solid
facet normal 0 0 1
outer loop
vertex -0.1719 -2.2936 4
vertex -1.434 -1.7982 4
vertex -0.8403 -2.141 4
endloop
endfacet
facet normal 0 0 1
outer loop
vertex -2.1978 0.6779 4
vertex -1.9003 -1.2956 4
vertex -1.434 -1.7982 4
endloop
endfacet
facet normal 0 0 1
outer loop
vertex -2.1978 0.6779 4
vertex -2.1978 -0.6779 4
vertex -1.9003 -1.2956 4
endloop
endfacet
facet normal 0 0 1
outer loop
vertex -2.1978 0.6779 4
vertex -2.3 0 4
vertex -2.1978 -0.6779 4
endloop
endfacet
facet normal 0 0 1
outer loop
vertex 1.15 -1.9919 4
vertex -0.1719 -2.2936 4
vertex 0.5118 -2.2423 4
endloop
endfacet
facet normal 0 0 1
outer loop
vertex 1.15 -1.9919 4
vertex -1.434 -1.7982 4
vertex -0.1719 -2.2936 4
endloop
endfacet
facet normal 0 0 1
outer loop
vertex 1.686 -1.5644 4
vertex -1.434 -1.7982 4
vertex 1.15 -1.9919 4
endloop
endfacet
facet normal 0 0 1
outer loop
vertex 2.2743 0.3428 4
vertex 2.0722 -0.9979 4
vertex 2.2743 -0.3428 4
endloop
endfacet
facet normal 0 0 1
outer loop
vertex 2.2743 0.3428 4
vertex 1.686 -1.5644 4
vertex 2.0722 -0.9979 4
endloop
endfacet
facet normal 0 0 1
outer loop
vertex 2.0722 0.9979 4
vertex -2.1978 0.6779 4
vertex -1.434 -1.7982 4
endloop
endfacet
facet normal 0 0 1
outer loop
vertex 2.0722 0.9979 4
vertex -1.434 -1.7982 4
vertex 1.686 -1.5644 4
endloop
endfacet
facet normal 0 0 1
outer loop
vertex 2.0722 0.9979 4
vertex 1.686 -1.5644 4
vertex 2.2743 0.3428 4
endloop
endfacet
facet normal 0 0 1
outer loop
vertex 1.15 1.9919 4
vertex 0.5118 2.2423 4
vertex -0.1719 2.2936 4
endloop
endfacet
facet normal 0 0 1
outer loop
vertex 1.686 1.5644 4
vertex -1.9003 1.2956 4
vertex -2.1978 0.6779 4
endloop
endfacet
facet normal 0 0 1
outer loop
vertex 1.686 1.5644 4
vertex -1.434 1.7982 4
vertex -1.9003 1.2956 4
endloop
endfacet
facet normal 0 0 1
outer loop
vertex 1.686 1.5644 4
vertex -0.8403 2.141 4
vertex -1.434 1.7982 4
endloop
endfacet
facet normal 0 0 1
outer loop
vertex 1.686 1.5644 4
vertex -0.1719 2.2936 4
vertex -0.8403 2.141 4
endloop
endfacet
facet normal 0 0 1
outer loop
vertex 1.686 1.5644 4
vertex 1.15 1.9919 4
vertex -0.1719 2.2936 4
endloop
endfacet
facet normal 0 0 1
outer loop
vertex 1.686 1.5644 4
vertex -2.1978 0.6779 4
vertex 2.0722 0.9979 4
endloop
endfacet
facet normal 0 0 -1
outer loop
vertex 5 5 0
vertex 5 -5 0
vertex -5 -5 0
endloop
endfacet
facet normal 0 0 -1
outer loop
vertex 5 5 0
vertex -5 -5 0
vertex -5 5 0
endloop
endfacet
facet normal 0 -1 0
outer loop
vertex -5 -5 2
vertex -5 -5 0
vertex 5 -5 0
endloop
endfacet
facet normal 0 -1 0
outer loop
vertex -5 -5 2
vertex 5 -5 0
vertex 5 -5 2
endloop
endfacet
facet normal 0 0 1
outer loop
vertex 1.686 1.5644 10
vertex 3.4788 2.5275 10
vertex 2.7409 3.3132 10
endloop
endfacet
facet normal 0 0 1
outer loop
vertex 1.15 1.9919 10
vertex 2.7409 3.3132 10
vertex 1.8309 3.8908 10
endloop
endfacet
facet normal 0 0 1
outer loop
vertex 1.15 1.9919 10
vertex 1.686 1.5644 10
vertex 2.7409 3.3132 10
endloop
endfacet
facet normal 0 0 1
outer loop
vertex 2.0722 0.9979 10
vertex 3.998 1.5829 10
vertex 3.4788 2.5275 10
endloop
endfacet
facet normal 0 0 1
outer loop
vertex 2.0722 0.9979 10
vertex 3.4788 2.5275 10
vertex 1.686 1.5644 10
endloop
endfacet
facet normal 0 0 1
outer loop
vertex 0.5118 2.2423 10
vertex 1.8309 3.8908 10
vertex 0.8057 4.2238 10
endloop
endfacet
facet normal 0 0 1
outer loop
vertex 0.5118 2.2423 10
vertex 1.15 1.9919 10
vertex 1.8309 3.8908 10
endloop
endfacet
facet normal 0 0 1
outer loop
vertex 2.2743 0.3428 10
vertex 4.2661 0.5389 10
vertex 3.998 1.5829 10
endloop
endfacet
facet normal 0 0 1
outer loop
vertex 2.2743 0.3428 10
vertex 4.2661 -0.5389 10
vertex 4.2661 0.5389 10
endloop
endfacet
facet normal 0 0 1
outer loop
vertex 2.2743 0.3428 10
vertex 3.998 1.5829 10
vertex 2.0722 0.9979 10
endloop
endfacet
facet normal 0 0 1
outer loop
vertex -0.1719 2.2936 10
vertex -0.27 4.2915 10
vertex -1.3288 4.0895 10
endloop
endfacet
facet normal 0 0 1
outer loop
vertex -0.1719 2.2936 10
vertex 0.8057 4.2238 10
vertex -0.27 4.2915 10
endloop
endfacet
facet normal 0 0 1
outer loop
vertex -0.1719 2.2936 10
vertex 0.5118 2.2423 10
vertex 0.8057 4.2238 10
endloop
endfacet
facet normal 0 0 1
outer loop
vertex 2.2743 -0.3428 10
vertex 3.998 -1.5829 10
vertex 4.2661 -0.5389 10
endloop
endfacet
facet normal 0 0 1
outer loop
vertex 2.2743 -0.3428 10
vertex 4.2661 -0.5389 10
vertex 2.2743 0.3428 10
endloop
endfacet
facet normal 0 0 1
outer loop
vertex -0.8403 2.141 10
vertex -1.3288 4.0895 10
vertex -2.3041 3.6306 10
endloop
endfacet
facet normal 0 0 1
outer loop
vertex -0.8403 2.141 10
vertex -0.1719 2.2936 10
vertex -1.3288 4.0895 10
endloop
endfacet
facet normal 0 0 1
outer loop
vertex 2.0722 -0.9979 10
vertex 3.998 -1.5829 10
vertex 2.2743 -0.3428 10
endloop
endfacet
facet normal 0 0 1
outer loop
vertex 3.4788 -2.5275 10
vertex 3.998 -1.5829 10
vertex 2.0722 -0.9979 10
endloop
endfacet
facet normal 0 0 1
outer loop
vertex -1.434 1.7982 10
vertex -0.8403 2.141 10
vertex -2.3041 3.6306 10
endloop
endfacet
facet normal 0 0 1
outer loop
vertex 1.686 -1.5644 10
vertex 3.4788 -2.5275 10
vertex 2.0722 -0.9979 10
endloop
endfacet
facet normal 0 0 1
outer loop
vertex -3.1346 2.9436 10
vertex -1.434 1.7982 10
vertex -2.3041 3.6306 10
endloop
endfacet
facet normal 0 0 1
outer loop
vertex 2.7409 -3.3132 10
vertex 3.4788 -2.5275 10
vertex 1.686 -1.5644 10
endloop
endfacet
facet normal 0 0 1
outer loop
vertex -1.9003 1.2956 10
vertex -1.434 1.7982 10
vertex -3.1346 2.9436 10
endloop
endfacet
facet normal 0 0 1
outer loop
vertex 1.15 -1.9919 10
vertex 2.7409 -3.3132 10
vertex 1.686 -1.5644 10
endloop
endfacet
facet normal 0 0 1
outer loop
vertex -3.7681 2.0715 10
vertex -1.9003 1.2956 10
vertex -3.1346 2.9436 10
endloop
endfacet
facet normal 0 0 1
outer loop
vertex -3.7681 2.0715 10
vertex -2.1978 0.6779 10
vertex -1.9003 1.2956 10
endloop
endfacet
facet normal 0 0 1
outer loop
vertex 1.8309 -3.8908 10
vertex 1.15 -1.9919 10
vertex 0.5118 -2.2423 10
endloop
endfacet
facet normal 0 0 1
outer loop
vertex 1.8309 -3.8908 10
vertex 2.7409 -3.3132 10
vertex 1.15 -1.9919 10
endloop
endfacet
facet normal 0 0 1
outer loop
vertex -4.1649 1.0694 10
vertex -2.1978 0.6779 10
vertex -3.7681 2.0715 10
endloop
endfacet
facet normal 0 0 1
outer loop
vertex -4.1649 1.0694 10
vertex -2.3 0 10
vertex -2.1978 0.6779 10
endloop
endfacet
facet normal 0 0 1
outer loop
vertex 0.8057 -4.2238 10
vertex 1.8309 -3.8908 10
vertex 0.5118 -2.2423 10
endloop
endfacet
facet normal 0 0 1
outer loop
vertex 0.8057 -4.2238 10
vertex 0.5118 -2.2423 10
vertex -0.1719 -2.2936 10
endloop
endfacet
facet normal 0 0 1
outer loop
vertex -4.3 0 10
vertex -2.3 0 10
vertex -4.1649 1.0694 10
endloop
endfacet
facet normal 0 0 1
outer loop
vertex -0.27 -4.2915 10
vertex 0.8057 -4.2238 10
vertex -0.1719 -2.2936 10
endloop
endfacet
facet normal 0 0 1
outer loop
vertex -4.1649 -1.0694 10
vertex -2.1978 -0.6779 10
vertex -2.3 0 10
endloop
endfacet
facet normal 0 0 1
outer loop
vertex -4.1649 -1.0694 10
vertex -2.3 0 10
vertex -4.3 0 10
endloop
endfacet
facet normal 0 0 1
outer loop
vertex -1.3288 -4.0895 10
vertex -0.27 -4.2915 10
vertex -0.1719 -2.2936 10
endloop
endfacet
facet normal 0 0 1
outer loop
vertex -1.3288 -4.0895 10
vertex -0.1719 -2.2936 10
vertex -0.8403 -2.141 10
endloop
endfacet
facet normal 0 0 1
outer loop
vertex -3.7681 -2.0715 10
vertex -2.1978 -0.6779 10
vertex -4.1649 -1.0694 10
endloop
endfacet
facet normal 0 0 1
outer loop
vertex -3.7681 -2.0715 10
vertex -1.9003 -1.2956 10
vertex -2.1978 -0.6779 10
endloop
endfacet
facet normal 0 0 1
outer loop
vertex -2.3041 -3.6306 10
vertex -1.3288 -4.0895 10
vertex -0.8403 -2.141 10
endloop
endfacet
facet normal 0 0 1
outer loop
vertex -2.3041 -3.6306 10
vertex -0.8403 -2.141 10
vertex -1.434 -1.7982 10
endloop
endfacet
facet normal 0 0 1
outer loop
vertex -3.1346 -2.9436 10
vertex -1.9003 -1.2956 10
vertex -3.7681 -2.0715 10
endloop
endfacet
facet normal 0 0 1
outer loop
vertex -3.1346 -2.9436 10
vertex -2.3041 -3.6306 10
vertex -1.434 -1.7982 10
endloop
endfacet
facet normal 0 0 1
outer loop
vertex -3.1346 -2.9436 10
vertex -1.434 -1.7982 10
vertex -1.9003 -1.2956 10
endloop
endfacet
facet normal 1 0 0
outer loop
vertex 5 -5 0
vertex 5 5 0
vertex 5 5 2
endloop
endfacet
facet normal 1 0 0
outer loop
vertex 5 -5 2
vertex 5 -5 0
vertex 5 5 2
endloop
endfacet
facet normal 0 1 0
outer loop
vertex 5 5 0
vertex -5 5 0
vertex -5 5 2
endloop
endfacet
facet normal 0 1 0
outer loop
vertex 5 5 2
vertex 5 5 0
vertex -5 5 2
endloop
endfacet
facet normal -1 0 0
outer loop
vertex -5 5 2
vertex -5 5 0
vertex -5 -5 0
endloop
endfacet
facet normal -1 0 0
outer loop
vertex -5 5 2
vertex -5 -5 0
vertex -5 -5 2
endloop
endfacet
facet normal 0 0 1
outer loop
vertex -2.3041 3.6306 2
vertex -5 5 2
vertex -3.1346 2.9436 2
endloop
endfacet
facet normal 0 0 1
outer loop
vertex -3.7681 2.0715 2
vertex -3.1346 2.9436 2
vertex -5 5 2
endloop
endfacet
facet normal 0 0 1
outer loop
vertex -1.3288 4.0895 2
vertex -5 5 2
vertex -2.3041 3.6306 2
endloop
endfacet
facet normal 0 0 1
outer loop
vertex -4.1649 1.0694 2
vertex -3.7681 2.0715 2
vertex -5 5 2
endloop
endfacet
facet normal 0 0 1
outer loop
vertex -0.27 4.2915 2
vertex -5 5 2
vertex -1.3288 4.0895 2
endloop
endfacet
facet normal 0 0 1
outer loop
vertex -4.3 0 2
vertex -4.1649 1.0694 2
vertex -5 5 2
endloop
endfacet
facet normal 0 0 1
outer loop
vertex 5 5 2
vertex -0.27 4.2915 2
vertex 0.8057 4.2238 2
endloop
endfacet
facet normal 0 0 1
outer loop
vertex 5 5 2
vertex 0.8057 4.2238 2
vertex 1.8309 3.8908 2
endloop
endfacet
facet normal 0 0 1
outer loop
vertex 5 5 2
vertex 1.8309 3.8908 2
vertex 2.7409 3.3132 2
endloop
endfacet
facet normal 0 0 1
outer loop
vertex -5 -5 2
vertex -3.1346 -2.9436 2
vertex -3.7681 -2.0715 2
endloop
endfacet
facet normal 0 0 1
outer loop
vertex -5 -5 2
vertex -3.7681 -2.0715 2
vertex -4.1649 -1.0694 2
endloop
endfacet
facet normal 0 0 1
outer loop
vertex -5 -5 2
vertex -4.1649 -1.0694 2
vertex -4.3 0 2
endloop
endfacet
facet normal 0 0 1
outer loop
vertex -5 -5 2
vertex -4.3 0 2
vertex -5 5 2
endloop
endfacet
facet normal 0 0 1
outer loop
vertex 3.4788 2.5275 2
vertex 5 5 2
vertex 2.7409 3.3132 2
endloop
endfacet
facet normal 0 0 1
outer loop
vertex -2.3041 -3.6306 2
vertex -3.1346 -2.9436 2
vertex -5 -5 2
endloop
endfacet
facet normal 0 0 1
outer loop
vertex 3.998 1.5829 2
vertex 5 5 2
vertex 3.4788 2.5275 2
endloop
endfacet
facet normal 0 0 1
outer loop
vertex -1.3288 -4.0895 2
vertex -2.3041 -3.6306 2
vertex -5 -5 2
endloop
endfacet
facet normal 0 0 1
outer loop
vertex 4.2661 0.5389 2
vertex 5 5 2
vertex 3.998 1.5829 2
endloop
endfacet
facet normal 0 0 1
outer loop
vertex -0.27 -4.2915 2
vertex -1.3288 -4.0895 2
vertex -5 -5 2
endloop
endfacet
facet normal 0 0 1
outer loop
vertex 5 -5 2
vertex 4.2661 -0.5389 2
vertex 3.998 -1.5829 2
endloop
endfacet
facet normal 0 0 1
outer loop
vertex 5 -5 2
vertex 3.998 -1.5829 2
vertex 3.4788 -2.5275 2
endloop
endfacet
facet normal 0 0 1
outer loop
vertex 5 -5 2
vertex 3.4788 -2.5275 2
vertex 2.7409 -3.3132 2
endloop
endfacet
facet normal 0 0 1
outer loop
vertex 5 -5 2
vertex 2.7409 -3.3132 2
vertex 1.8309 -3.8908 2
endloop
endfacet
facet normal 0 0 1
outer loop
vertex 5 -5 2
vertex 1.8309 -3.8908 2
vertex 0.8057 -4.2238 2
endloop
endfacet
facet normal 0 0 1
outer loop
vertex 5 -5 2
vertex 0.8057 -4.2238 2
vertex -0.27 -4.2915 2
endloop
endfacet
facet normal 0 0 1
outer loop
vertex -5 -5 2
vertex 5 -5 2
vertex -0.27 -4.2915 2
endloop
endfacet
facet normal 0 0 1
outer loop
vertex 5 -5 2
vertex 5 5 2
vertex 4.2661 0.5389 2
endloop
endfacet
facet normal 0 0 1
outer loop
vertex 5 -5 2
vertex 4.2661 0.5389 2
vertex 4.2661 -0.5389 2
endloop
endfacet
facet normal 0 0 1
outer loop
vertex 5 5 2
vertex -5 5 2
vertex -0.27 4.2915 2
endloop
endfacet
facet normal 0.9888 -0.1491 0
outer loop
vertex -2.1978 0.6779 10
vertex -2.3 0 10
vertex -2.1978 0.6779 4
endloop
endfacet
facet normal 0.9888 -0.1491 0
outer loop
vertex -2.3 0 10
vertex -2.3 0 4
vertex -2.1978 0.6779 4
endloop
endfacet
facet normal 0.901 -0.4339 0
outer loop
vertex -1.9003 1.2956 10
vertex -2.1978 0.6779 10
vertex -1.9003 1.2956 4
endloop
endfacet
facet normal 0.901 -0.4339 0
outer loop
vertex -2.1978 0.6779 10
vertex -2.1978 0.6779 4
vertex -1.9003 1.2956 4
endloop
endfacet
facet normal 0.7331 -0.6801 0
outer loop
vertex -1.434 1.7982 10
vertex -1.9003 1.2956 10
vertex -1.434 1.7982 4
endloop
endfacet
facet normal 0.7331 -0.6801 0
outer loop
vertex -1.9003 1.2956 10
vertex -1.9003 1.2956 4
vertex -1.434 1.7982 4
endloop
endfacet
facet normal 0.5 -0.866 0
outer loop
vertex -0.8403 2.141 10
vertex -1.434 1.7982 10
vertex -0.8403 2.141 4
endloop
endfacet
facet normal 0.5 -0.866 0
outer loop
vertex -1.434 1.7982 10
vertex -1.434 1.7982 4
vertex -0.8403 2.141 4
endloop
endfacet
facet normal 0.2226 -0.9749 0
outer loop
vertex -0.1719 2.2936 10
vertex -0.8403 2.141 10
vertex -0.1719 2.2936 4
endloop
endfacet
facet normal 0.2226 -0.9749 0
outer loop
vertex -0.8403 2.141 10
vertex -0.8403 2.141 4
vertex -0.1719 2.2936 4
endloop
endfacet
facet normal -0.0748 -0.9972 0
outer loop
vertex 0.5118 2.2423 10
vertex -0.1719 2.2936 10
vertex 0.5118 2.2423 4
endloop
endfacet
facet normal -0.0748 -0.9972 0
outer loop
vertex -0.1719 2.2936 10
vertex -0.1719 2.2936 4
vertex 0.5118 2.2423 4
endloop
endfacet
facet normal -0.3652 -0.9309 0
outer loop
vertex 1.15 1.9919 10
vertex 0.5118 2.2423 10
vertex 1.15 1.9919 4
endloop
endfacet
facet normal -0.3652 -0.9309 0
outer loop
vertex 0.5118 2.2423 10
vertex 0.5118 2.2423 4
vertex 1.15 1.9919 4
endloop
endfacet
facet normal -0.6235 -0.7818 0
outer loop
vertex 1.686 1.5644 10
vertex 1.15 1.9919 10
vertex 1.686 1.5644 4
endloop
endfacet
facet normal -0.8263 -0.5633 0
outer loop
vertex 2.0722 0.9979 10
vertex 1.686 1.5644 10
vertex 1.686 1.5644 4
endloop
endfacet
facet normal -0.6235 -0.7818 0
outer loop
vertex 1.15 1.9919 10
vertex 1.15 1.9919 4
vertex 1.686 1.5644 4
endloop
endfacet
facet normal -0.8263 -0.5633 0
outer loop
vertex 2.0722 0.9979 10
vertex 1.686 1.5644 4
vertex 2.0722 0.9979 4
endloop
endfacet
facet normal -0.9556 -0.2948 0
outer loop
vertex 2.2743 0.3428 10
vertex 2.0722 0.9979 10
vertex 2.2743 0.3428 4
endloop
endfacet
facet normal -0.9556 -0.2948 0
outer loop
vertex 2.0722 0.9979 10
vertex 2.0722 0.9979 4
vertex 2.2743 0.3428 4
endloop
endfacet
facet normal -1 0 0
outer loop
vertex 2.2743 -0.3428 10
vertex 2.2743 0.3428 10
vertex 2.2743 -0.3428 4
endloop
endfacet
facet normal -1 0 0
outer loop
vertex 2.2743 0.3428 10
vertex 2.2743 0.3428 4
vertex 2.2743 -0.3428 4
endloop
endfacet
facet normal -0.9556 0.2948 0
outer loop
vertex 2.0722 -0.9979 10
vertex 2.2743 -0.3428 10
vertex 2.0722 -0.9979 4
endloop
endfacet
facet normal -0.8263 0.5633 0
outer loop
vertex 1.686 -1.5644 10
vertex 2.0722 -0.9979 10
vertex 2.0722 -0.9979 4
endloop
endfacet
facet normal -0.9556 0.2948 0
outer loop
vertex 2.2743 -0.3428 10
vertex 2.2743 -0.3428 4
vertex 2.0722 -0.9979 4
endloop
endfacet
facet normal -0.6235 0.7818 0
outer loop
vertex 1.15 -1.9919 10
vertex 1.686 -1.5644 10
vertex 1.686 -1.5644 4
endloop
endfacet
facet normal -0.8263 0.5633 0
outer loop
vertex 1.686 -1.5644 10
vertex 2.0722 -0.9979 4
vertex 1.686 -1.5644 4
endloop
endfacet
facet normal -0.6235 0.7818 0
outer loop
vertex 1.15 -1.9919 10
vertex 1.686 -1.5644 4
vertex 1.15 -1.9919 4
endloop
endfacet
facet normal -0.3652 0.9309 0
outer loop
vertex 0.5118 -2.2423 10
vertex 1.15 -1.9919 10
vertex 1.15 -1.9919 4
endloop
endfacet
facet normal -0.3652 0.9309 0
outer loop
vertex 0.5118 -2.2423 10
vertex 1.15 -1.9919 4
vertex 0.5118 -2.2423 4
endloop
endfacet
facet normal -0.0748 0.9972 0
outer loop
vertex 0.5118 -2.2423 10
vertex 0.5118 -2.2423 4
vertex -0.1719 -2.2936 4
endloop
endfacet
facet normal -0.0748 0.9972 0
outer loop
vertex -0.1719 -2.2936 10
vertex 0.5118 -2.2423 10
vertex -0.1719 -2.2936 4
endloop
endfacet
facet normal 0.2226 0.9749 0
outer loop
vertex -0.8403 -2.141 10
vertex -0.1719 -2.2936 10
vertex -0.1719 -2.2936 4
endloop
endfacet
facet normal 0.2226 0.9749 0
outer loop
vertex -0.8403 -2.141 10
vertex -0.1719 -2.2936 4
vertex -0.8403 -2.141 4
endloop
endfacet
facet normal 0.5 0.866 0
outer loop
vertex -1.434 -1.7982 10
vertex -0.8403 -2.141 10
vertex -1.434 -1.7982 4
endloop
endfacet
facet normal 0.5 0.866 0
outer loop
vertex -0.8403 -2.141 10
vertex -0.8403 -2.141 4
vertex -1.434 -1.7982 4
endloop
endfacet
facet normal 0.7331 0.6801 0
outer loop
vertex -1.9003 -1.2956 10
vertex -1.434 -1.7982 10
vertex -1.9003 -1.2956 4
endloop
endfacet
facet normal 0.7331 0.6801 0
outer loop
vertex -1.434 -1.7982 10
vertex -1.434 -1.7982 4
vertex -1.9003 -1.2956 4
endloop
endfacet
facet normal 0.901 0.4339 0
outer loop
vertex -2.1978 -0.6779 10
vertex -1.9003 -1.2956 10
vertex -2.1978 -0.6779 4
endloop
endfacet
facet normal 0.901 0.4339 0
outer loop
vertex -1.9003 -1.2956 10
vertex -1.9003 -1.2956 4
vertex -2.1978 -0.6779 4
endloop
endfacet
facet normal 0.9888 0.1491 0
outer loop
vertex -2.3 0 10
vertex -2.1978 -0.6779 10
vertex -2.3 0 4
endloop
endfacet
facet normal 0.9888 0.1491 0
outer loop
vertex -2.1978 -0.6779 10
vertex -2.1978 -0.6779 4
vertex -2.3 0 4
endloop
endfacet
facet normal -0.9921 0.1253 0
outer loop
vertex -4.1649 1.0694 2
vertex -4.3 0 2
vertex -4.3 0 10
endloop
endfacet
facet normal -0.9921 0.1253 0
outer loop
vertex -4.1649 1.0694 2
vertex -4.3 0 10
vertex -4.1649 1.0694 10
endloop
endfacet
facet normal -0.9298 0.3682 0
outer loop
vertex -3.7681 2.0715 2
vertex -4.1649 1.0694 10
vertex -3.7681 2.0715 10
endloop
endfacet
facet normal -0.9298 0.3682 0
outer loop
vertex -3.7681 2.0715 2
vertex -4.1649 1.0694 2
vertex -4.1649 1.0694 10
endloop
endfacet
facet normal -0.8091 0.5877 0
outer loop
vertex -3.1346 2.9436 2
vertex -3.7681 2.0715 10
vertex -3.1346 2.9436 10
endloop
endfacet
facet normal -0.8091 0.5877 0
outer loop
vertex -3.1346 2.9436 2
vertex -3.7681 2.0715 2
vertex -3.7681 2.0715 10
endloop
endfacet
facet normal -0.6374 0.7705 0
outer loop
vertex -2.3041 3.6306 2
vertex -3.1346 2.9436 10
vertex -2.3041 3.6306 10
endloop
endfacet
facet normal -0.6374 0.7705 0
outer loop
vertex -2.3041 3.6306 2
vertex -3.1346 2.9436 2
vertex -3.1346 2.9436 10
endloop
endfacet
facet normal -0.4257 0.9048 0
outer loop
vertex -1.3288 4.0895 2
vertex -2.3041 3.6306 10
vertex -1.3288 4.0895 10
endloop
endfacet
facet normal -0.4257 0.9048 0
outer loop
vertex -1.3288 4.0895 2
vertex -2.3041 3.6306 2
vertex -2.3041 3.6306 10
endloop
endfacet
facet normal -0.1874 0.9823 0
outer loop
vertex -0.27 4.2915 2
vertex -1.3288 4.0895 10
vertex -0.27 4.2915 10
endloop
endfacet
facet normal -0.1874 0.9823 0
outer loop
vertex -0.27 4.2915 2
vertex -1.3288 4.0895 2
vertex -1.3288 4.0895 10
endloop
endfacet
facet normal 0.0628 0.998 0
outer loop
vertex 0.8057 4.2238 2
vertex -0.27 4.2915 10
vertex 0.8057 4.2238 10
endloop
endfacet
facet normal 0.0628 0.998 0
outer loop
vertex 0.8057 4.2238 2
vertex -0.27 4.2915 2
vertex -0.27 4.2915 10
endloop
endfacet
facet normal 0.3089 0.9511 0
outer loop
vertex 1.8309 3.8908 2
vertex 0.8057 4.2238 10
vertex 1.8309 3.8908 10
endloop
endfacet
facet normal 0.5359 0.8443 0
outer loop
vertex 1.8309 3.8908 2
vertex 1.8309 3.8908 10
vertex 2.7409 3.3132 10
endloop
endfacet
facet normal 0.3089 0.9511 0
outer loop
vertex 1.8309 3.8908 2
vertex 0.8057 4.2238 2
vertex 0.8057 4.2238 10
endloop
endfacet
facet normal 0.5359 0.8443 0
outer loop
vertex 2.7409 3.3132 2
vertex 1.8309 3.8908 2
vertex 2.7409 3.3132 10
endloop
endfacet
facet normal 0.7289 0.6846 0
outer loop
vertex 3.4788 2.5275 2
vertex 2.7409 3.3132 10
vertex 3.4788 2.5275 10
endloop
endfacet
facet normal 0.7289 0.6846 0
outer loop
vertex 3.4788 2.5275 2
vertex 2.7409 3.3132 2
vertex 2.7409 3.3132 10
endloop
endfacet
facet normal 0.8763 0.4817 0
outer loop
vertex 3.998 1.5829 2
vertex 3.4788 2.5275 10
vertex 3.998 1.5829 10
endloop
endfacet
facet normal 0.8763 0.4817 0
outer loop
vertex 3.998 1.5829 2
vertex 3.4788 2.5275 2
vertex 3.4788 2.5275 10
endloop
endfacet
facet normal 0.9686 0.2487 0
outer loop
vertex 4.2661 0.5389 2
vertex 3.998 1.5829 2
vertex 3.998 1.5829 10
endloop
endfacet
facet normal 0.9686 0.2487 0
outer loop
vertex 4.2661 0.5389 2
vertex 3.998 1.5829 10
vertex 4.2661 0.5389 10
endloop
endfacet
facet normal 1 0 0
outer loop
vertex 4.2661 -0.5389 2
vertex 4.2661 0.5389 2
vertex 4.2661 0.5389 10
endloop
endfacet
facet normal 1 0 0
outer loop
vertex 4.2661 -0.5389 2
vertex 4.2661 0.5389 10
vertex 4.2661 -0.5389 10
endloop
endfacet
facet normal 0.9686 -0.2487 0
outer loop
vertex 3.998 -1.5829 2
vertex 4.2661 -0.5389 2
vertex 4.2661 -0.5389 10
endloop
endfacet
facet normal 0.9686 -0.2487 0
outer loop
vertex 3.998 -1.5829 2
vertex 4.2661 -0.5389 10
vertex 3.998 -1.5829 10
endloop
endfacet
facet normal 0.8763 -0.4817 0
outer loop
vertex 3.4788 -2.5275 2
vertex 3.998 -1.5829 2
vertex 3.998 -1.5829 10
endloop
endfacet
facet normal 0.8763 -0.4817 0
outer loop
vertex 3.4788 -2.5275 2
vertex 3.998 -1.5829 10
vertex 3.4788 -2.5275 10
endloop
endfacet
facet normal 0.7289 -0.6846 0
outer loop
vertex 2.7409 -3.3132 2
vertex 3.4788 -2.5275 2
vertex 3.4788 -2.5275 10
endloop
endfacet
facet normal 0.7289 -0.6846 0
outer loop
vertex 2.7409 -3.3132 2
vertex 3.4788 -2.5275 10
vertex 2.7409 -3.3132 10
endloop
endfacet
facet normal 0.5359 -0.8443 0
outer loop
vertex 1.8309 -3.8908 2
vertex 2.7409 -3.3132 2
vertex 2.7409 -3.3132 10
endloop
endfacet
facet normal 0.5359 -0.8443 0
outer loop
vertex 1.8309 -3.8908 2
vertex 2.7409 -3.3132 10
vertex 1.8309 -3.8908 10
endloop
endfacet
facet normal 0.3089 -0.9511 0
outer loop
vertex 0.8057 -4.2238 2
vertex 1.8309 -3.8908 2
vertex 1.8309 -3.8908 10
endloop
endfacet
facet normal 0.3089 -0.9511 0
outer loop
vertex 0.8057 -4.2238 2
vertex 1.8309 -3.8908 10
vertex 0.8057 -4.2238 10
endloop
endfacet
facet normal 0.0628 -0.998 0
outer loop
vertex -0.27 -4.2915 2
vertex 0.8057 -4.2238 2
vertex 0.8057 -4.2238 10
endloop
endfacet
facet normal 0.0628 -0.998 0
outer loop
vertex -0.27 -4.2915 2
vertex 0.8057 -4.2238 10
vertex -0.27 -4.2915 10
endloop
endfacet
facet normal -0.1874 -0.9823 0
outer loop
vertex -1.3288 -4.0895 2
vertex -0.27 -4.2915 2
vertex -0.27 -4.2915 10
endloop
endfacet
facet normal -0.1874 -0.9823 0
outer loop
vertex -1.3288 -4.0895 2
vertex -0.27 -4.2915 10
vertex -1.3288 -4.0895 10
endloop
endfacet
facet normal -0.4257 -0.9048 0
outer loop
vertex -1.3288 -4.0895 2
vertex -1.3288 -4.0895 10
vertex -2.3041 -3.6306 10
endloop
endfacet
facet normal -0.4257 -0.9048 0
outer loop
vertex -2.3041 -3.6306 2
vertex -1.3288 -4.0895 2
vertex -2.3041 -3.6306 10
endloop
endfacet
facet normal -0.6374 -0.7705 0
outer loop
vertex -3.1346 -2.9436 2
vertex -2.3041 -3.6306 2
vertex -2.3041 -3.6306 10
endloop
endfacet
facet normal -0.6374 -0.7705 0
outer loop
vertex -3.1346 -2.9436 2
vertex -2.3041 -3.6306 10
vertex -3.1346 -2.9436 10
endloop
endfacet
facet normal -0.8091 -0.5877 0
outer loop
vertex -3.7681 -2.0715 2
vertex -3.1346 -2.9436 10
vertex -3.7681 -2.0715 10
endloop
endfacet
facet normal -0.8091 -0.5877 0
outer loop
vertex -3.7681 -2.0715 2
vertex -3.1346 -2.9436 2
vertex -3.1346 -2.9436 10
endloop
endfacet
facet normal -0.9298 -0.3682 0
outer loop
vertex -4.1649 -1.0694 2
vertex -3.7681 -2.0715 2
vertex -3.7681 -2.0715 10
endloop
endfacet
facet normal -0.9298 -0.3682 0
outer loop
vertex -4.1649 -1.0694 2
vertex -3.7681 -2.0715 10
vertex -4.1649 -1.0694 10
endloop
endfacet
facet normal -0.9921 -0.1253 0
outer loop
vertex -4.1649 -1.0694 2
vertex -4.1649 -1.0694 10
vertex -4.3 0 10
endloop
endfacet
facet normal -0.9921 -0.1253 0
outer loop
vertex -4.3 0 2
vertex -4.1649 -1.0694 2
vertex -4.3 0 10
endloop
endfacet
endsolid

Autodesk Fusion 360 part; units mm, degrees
sketch "Skizze1" plane through (0, 0, 0) normal (0, 0, 1) x (1, 0, 0)
  line L0 (-4, 4) -> (4, 4)
  line L1 (4, 4) -> (4, -4)
  line L2 (4, -4) -> (-4, -4)
  line L3 (-4, -4) -> (-4, 4)
  line L4 (-4, 4) -> (4, -4) construction
  line L5 (4, 4) -> (-4, -4) construction
  dimension "d1" = 8
  dimension "d2" = 8
extrude "Extrusion1" add sketch "Skizze1" along normal blind 2
sketch "Skizze2" plane through (0, 0, 2) normal (0, 0, 1) x (-1, 0, 0)
  line L0 (4, 4) -> (-4, 4)
  line L1 (-4, 4) -> (-4, -4)
  line L2 (-4, -4) -> (4, -4)
  line L3 (4, -4) -> (4, 4)
  circle A0 centre (0, 0) radius 2.3
  circle A1 centre (0, 0) radius 3.3
  dimension "d5" = 4.6
  dimension "d6" = 6.6
extrude "Extrusion2" add sketch "Skizze2" along normal blind 8 contours A1
extrude "Extrusion3" add 1 faces at (0.6334, 0.4319, 2) along direction (0, 0, 1) blind 2
extrude "Extrusion4" add 1 faces at (1.3333, -4, 0.6667) along direction (0, -1, 0) blind 1
extrude "Extrusion5" add 1 faces at (4, 1, 0.6667) along direction (1, 0, 0) blind 1
extrude "Extrusion6" add 1 faces at (2, 4, 1.3333) along direction (0, 1, 0) blind 1
extrude "Extrusion7" add 1 faces at (-4, 1.6667, 0.6667) along direction (-1, 0, 0) blind 1
move_face "Flächen versetzen1" offset 1 1 faces at (-3.2959, 0.1645, 7.3333)
